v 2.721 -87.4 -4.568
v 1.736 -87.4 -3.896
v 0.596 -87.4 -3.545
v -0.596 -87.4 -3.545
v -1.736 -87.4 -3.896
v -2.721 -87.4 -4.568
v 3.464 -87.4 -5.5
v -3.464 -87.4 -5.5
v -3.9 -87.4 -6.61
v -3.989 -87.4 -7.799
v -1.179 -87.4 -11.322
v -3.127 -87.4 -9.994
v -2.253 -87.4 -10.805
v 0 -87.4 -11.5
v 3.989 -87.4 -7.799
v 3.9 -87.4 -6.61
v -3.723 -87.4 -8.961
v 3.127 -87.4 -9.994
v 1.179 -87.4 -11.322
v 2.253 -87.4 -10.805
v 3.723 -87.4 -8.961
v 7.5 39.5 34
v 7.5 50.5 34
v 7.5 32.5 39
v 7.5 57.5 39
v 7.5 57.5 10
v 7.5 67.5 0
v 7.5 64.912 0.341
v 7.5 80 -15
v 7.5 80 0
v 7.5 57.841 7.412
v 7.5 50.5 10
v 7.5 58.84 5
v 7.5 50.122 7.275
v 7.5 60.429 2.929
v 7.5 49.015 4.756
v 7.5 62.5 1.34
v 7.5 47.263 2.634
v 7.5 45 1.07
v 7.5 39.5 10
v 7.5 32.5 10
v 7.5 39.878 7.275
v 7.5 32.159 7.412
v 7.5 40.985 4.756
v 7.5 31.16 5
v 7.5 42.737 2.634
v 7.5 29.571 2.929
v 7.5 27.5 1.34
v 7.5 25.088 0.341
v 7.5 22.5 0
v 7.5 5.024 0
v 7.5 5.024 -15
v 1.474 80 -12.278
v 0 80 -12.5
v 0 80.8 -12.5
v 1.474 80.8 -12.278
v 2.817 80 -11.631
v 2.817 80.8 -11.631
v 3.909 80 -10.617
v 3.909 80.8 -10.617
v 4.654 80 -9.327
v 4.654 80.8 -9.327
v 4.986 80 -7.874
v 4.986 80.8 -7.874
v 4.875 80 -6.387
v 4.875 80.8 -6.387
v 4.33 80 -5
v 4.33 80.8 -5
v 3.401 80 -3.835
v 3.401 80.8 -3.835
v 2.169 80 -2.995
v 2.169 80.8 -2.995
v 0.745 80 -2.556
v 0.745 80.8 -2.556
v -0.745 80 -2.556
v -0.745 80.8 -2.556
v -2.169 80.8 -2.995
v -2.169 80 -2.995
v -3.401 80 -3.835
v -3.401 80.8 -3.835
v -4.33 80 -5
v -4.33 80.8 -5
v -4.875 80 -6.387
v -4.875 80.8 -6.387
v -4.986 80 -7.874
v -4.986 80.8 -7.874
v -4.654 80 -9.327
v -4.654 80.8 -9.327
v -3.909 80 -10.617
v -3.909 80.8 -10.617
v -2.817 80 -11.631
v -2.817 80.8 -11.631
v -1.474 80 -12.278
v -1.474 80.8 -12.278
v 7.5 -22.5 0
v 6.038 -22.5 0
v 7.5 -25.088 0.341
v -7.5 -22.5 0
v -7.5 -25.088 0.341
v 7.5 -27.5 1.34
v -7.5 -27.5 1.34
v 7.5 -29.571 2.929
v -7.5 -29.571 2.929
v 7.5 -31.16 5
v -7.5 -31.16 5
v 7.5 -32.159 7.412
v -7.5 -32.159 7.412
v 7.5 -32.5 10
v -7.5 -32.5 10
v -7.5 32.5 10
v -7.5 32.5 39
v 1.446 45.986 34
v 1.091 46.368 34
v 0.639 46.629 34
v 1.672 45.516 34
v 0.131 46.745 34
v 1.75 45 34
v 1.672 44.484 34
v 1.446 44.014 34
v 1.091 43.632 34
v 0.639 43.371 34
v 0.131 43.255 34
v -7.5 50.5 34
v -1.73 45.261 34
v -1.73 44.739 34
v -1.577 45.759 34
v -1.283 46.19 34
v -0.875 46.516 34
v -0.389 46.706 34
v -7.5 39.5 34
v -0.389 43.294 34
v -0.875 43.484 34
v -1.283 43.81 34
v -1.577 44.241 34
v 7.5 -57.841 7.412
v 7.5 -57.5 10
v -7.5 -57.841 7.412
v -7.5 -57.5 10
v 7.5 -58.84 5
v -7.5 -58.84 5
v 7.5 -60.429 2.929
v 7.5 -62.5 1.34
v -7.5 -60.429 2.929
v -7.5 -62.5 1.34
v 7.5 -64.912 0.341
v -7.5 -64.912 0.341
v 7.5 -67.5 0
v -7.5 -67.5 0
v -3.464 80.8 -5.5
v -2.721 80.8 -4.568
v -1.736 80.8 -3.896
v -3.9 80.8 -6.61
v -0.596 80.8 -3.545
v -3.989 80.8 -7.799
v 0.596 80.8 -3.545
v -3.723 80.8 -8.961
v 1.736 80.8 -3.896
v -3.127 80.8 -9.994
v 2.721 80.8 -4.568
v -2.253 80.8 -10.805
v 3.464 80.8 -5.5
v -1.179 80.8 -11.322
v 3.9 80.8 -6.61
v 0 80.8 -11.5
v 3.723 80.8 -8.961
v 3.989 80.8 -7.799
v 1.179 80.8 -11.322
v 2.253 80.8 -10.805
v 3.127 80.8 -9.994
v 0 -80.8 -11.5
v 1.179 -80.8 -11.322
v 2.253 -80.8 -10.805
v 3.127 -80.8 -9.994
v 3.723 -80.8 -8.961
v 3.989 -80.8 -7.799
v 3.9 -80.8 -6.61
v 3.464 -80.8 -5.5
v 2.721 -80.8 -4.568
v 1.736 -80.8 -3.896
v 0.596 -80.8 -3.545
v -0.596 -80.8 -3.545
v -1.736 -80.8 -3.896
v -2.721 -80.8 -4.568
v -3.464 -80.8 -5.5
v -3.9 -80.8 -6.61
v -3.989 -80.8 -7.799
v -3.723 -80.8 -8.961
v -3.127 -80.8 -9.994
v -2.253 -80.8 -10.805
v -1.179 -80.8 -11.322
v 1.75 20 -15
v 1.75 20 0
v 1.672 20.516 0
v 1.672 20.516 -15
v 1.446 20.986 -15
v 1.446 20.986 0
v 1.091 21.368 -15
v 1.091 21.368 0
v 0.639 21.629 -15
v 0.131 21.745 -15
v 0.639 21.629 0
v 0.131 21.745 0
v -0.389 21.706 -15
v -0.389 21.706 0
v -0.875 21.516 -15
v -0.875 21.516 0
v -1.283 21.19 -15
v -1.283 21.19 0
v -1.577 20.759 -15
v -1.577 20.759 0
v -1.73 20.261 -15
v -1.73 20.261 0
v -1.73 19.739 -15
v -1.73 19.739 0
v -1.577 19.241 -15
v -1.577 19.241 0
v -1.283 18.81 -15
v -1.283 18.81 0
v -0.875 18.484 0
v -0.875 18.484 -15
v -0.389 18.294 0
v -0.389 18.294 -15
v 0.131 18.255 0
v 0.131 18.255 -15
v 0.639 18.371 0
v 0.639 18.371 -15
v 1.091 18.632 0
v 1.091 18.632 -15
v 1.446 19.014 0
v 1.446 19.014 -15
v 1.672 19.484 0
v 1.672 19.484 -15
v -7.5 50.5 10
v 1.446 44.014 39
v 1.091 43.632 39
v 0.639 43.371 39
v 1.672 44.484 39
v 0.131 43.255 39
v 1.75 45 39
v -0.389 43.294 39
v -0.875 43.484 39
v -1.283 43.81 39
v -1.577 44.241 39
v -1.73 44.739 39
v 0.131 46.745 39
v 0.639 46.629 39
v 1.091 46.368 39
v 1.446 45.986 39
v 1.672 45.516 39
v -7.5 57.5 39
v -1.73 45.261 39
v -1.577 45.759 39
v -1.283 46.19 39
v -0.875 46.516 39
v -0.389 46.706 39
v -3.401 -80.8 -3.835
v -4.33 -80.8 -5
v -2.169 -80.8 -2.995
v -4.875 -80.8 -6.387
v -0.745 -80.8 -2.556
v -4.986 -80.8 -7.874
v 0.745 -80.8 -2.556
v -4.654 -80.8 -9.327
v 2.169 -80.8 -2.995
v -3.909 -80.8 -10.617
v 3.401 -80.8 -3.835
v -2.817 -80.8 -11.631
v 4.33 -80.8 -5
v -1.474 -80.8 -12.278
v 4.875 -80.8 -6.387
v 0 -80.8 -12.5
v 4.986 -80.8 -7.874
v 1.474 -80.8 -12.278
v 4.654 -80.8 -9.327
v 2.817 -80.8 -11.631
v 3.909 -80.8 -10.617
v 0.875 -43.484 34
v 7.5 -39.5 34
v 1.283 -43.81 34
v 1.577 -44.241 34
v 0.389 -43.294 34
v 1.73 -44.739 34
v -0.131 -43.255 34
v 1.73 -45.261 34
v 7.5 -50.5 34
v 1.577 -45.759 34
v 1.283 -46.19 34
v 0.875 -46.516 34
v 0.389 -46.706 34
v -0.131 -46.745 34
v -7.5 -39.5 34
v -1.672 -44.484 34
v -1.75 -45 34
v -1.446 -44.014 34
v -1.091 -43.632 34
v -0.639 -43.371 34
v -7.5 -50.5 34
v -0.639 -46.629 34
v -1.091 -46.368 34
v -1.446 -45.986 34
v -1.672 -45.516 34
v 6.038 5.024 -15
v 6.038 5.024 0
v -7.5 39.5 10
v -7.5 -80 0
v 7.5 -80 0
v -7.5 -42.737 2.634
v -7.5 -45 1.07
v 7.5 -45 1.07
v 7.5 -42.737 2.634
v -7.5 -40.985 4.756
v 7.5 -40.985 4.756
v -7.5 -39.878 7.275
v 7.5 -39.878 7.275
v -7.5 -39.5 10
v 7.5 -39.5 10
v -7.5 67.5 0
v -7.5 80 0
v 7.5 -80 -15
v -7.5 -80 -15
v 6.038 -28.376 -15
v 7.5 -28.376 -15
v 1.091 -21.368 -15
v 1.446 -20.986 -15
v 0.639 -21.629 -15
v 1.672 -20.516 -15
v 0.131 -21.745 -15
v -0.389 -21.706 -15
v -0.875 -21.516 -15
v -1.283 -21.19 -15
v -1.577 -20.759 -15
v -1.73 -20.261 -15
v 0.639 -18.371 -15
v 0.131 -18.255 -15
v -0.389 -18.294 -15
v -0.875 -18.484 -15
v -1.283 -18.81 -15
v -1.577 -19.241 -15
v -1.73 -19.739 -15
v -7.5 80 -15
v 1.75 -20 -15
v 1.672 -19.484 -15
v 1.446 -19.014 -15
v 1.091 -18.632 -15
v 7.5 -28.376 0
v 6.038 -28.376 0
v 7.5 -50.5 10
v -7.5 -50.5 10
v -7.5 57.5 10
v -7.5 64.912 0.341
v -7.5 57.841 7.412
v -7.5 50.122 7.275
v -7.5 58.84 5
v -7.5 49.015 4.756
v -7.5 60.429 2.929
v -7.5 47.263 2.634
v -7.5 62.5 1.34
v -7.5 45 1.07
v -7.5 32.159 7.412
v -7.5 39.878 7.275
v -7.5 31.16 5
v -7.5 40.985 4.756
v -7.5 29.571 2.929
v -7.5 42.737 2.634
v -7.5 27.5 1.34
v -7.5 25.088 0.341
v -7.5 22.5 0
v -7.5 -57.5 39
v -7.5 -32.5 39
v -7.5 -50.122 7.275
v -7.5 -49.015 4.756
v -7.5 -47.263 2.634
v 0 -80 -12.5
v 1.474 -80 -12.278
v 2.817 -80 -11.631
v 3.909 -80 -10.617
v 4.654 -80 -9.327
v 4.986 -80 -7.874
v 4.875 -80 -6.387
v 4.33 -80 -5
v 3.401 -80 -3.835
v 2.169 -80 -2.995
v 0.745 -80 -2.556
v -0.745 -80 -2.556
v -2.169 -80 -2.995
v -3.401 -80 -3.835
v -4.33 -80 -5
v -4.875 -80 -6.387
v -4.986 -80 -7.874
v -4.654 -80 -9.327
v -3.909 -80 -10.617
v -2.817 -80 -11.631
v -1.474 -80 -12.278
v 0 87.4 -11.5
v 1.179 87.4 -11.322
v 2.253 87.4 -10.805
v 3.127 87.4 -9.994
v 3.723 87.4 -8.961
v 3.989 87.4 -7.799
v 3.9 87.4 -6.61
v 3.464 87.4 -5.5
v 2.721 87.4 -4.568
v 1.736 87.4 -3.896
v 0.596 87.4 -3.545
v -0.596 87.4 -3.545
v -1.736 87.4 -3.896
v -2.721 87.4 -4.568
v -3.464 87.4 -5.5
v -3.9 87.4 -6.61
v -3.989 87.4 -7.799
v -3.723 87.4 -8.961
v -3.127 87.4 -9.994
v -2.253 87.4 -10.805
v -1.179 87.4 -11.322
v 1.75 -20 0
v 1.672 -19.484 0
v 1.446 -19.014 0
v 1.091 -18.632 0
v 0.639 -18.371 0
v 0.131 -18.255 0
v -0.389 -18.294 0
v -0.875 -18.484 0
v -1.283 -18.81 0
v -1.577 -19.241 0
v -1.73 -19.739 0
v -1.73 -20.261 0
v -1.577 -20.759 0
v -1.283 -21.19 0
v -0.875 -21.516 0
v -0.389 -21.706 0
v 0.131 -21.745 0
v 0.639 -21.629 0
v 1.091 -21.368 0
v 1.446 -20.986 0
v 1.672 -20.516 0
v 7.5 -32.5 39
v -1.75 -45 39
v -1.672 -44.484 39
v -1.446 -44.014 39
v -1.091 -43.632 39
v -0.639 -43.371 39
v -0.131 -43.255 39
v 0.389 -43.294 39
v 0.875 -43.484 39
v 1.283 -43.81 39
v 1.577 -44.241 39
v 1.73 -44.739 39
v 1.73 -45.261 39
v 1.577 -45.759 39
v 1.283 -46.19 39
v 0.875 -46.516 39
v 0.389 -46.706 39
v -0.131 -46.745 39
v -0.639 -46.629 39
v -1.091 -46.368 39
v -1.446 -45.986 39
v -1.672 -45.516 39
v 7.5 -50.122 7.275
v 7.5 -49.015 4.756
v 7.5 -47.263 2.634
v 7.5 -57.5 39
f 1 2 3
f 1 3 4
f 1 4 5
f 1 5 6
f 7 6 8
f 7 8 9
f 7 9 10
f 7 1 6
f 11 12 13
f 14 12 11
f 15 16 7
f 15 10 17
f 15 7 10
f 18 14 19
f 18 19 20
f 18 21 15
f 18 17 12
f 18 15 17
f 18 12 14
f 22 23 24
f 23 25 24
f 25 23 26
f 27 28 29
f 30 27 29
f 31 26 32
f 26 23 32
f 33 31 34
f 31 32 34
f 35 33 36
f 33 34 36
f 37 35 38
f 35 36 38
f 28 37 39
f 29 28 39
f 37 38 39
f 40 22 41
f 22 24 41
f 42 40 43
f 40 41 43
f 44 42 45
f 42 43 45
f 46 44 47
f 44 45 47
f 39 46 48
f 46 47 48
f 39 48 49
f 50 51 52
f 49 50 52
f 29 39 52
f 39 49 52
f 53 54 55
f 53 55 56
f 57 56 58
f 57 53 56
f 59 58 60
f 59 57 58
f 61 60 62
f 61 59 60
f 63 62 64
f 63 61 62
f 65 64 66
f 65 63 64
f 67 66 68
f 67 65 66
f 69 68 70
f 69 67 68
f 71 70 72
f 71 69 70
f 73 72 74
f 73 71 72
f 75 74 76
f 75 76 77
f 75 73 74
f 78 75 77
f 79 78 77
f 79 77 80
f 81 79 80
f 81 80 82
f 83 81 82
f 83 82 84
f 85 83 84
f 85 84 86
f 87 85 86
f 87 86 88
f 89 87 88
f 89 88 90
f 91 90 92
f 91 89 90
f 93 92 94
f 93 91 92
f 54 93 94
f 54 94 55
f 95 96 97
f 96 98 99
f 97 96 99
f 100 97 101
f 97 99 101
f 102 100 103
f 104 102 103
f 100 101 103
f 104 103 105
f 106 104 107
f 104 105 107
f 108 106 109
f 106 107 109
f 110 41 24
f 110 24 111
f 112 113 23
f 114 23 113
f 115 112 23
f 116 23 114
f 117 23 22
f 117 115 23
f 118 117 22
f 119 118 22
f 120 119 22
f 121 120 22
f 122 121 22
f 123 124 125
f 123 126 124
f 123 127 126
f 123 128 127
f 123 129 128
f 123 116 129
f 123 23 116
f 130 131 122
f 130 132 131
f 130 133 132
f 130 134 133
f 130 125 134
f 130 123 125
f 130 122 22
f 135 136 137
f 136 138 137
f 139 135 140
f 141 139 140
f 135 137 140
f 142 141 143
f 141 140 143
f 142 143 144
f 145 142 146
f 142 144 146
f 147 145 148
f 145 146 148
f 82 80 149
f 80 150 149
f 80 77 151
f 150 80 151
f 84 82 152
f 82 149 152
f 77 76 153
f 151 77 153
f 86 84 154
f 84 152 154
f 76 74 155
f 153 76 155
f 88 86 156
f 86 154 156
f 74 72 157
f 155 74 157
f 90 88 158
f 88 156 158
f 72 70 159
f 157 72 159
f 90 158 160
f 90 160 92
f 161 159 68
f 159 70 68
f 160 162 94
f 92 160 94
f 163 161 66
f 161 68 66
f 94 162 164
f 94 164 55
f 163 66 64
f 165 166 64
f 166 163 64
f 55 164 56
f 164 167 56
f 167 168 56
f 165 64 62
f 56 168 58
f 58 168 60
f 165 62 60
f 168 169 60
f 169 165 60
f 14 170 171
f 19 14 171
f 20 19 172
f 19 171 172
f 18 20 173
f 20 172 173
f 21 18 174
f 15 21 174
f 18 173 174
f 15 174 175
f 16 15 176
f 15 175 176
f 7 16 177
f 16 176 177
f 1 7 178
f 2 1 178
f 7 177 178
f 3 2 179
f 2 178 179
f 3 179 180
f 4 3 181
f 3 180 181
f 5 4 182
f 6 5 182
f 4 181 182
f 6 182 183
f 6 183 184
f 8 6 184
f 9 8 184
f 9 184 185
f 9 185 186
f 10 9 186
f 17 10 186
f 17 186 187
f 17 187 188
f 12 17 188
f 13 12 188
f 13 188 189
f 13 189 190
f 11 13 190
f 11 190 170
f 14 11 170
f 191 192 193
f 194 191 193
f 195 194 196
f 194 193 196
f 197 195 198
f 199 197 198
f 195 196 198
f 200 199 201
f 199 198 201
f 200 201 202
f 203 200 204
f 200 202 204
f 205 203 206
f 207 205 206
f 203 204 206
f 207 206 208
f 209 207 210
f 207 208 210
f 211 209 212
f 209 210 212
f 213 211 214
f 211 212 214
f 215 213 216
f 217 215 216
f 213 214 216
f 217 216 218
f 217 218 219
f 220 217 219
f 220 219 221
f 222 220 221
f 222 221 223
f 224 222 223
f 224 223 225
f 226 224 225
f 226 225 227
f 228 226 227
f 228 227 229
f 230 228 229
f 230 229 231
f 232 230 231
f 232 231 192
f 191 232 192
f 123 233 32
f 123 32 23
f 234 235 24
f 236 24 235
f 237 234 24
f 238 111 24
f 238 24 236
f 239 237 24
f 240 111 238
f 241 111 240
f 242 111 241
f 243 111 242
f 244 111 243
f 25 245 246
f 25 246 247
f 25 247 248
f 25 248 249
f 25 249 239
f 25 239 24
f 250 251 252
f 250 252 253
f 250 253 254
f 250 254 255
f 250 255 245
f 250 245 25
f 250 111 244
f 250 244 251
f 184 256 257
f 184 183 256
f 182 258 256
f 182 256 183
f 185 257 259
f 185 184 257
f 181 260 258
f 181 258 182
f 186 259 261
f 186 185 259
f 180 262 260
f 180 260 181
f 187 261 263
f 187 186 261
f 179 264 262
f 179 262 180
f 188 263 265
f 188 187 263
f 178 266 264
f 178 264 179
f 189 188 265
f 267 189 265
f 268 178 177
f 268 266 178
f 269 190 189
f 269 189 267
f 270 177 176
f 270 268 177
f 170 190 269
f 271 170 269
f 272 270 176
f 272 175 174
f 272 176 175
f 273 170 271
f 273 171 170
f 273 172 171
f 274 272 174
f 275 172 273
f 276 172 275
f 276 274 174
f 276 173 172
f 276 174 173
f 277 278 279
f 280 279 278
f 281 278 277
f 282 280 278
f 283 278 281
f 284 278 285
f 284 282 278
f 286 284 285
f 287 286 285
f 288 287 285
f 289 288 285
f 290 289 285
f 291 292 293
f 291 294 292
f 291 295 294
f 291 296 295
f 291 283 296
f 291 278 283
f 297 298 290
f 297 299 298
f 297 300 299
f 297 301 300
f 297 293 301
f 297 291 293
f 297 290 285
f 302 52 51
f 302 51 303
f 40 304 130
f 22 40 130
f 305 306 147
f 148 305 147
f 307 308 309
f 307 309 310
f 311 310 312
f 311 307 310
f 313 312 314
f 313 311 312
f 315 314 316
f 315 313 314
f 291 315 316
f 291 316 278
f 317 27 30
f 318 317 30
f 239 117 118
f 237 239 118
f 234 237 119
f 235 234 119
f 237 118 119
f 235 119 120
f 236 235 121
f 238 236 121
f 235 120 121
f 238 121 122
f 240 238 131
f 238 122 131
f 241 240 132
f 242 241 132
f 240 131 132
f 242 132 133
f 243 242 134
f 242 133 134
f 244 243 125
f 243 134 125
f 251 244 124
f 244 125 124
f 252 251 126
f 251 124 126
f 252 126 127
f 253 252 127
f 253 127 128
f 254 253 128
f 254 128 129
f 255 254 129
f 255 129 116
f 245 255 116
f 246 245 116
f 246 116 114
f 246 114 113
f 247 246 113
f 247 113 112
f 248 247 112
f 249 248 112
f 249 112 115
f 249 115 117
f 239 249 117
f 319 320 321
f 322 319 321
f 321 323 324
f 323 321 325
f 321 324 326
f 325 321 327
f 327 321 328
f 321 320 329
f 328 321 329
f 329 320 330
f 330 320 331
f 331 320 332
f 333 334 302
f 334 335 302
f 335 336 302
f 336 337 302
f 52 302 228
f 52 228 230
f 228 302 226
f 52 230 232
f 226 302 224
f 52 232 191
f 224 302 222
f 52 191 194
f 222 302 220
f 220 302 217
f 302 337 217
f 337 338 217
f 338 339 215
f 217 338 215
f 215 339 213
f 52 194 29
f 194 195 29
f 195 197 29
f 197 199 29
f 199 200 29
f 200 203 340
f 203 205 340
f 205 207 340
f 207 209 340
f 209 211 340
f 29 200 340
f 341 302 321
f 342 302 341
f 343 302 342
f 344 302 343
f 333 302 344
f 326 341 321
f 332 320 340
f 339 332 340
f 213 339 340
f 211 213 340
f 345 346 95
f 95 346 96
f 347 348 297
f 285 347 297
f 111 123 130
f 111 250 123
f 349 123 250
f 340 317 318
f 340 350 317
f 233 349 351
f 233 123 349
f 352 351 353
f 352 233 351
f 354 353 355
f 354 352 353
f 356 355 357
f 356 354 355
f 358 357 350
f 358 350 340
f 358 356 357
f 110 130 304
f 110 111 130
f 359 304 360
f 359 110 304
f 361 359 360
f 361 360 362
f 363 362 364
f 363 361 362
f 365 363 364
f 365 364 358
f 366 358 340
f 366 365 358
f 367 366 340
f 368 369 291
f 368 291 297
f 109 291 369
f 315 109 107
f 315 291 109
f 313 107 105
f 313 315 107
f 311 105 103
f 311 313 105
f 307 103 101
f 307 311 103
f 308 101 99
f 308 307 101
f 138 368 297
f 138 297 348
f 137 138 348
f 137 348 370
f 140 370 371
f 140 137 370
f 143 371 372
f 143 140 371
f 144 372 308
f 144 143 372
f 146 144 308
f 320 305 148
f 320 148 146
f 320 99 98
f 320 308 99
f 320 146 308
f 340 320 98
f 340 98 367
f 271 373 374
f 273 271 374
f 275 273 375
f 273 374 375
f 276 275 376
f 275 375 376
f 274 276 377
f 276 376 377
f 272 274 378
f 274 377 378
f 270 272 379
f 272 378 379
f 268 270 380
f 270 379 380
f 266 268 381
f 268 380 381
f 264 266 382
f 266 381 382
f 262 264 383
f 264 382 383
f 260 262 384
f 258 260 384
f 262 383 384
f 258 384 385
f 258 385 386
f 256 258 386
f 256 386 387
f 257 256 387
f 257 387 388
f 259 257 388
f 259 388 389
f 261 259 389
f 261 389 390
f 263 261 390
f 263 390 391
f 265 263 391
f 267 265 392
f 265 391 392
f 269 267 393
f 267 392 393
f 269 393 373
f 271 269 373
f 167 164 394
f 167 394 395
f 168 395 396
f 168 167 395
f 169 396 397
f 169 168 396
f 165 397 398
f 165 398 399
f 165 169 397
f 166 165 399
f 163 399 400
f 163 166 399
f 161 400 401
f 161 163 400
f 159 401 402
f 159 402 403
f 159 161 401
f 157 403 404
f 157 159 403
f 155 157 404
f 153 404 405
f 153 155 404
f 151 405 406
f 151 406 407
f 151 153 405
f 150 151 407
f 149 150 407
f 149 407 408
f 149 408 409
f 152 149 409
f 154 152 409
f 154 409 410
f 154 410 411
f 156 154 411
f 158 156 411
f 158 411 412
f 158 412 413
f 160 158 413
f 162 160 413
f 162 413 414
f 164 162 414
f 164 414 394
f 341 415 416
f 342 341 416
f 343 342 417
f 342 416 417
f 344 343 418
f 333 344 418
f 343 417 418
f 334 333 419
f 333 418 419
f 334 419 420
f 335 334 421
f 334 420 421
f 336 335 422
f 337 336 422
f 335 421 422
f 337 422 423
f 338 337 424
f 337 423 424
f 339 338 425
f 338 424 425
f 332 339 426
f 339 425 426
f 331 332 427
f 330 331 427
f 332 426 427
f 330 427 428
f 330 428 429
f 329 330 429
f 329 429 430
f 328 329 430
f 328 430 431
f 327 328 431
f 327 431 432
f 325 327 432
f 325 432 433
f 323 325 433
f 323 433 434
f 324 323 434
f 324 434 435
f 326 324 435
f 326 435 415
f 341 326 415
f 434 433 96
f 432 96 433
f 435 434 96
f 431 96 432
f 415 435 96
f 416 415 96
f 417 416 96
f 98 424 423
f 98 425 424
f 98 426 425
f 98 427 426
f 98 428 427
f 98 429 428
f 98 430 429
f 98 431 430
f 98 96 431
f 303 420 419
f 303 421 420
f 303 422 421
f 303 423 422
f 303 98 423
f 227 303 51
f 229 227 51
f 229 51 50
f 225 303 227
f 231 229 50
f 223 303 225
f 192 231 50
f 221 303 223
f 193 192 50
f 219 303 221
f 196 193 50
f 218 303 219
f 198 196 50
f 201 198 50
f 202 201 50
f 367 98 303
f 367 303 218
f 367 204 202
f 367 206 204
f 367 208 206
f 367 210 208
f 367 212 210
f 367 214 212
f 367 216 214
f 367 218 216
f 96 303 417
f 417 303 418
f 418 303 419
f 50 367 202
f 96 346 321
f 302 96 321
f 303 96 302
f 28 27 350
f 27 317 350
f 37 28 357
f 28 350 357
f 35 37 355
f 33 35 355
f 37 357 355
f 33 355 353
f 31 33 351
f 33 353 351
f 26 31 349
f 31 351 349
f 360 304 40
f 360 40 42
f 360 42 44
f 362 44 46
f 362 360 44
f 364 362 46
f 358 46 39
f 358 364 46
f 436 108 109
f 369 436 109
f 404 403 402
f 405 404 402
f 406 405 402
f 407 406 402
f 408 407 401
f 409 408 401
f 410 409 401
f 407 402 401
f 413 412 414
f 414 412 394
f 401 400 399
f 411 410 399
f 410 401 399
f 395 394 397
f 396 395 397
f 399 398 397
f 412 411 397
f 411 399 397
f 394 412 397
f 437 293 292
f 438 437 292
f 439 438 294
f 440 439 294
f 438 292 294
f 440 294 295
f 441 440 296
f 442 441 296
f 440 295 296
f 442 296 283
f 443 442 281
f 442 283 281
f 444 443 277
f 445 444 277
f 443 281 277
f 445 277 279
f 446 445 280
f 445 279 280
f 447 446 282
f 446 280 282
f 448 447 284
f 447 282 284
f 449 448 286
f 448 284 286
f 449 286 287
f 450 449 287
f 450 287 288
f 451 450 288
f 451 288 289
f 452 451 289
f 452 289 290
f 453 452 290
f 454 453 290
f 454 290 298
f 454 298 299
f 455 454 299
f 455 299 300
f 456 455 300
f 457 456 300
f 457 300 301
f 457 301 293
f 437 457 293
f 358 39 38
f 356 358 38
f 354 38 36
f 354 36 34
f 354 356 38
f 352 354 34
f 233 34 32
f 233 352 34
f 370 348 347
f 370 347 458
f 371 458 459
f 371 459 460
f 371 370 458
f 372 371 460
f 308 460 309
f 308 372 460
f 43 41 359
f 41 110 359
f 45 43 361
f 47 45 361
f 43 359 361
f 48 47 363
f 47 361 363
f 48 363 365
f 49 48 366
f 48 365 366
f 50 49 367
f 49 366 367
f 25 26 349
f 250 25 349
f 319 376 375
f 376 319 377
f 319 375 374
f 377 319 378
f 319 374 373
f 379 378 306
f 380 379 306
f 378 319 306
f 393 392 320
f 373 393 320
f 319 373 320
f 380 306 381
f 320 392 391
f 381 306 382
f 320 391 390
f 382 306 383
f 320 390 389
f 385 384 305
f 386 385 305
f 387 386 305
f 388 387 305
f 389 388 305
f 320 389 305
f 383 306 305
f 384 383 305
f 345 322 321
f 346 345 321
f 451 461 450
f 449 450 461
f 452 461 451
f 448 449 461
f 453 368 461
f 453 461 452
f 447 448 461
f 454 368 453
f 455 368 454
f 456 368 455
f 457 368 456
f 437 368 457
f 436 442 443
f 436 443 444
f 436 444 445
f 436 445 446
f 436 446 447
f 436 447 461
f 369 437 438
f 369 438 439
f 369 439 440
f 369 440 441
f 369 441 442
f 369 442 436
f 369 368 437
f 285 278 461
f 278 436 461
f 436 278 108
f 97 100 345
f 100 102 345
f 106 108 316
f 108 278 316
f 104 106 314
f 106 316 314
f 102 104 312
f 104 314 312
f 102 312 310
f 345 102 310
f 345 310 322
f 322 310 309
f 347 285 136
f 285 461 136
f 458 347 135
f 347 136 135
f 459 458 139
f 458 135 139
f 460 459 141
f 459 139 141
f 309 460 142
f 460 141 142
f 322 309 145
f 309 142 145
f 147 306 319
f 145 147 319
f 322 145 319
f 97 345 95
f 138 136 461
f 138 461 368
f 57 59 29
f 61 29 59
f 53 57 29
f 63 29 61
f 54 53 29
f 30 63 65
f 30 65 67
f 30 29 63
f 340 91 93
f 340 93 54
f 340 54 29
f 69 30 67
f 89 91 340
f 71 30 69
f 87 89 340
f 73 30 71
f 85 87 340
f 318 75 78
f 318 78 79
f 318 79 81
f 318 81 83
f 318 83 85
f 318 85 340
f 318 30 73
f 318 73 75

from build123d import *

# Parameters (mm, degrees)
ESQUISSE1_W                      = 25
ESQUISSE1_H                      = 15
BOSS_EXTRU_1_DEPTH               = 39
BOSS_EXTRU_1_2_DEPTH             = 39
ESQUISSE3_W                      = 160
ESQUISSE3_H                      = 15
BOSS_EXTRU_2_DEPTH               = 15
ESQUISSE4_R                      = 5
ESQUISSE4_R_2                    = 4
BOSS_EXTRU_5_DEPTH               = 0.8
ESQUISSE4_6_R                    = 4
BOSS_EXTRU_6_DEPTH               = 7.4
CONG_1_R                         = 10
ESQUISSE5_W                      = 11
ESQUISSE5_H                      = 34
ENL_V_MAT_EXTRU_1_DEPTH          = 97.874970968
CONG_2_R                         = 10
ESQUISSE6_R                      = 1.75
ENL_V_MAT_EXTRU_2_DEPTH          = 101.478903258
ESQUISSE11_R                     = 1.75
TROUS_VIS_SUPPORT_CAPTEURS_DEPTH = 97.000052083
ESQUISSE12_W                     = 33.4
ESQUISSE12_H                     = 4.7
ENCOCHE_CARTE_CAPTEUR_DEPTH      = 97.000052083


with BuildPart() as part:
    # Esquisse1 → Boss.-Extru.1 (new body)
    with BuildSketch(Plane(origin=(0, 0, 0), x_dir=(0, 1, 0), z_dir=(0, 0, 1))):
        with Locations((-45, 0)):
            Rectangle(ESQUISSE1_W, ESQUISSE1_H)
    extrude(amount=BOSS_EXTRU_1_DEPTH)



with BuildPart() as body_2:
    # Esquisse1 → Boss.-Extru.1 2 (new body)
    with BuildSketch(Plane(origin=(0, 0, 0), x_dir=(0, 1, 0), z_dir=(0, 0, 1))):
        with Locations((45, 0)):
            Rectangle(ESQUISSE1_W, ESQUISSE1_H)
    extrude(amount=BOSS_EXTRU_1_2_DEPTH)


with BuildPart() as part_1:
    add(part.part)

    add(body_2.part)  # Boss.-Extru.2 merges body 2
    # Esquisse3 → Boss.-Extru.2 (add)
    with BuildSketch(Plane(origin=(0, 0, 0), x_dir=(0, 1, 0), z_dir=(0, 0, 1))):
        Rectangle(ESQUISSE3_W, ESQUISSE3_H)
    extrude(amount=-BOSS_EXTRU_2_DEPTH)

    # Esquisse4 → Boss.-Extru.5 (add)
    with BuildSketch(Plane(origin=(0, -80, 0), x_dir=(-1, 0, 0), z_dir=(0, -1, 0))):
        with Locations(Location((0, 7.5, 0), (0, 0, 90))):
            Circle(ESQUISSE4_R)
        with Locations(Location((0, 7.5, 0), (0, 0, 90))):
            Circle(ESQUISSE4_R_2, mode=Mode.SUBTRACT)
    boss_extru_5 = extrude(amount=BOSS_EXTRU_5_DEPTH)

    # Esquisse4<6> → Boss.-Extru.6 (add)
    with BuildSketch(Plane(origin=(0, -80, 0), x_dir=(-1, 0, 0), z_dir=(0, -1, 0))):
        with Locations(Location((0, 7.5, 0), (0, 0, 90))):
            Circle(ESQUISSE4_6_R)
    boss_extru_6 = extrude(amount=BOSS_EXTRU_6_DEPTH)

    # Symétrie2: Boss.-Extru.5, Boss.-Extru.6 across plane
    add(boss_extru_5.mirror(Plane.ZX))
    add(boss_extru_6.mirror(Plane.ZX))

    # Congé1
    cong_1_edges = [part_1.edges().sort_by_distance(p)[0] for p in [
        (0, 57.5, 0),
        (0, 32.5, 0),
        (0, -57.5, 0),
        (0, -32.5, 0),
    ]]
    fillet(cong_1_edges, radius=CONG_1_R)

    # Esquisse5 → Enlèv. mat.-Extru.1 (cut, through all)
    with BuildSketch(Plane(origin=(-7.5, 0, 0), x_dir=(0, -1, 0), z_dir=(-1, 0, 0))):
        with Locations((45, 17)):
            Rectangle(ESQUISSE5_W, ESQUISSE5_H)
        with Locations((-45, 17)):
            Rectangle(ESQUISSE5_W, ESQUISSE5_H)
    extrude(amount=-ENL_V_MAT_EXTRU_1_DEPTH, mode=Mode.SUBTRACT)

    # Congé2
    # the kernel refuses this fillet: 10 mm, written as the material it adds along each edge
    with BuildSketch(Plane(origin=(-7.5, 39.5, 0), x_dir=(0, 0, 1), z_dir=(1, 0, 0)), Plane(origin=(-7.5, -39.5, 0), x_dir=(0, -1, 0), z_dir=(1, 0, 0)), Plane(origin=(-7.5, -50.5, 0), x_dir=(0, 0, 1), z_dir=(1, 0, 0))) as cong_2_piece_1:
        with BuildLine():
            CenterArc((CONG_2_R, -CONG_2_R), CONG_2_R, 90, 90)
            Line((0, -CONG_2_R), (0, 0))
            Line((0, 0), (CONG_2_R, 0))
        make_face()
    extrude(amount=15)
    with BuildSketch(Plane(origin=(-7.5, 50.5, 0), x_dir=(0, 0, 1), z_dir=(1, 0, 0))) as cong_2_piece_2:
        with BuildLine():
            CenterArc((CONG_2_R, CONG_2_R), CONG_2_R, 180, 90)
            Line((0, CONG_2_R), (0, 0))
            Line((0, 0), (CONG_2_R, 0))
        make_face()
    extrude(amount=15)

    # Esquisse6 → Enlèv. mat.-Extru.2 (cut, through all)
    with BuildSketch(Plane(origin=(0, 0, 34), x_dir=(1, 0, 0), z_dir=(0, 0, -1))):
        with Locations(Location((0, 45, 0), (0, 0, 180))):
            Circle(ESQUISSE6_R)
        with Locations((0, -45)):
            Circle(ESQUISSE6_R)
    extrude(amount=-ENL_V_MAT_EXTRU_2_DEPTH, mode=Mode.SUBTRACT)

    # Esquisse11 → Trous vis support capteurs (cut, through all)
    with BuildSketch(Plane(origin=(0, 0, 0), x_dir=(0, 1, 0), z_dir=(0, 0, 1))):
        with Locations(Location((20, 0, 0), (0, 0, 270))):
            Circle(ESQUISSE11_R)
        with Locations(Location((-20, 0, 0), (0, 0, 270))):
            Circle(ESQUISSE11_R)
    extrude(amount=-TROUS_VIS_SUPPORT_CAPTEURS_DEPTH, mode=Mode.SUBTRACT)

    # Esquisse12 → Encoche carte capteur (cut, through all)
    with BuildSketch(Plane(origin=(0, 0, 0), x_dir=(0, 1, 0), z_dir=(0, 0, 1))):
        with Locations((-11.675958981, -8.388484641)):
            Rectangle(ESQUISSE12_W, ESQUISSE12_H)
    extrude(amount=-ENCOCHE_CARTE_CAPTEUR_DEPTH, mode=Mode.SUBTRACT)


solid = part_1.part
